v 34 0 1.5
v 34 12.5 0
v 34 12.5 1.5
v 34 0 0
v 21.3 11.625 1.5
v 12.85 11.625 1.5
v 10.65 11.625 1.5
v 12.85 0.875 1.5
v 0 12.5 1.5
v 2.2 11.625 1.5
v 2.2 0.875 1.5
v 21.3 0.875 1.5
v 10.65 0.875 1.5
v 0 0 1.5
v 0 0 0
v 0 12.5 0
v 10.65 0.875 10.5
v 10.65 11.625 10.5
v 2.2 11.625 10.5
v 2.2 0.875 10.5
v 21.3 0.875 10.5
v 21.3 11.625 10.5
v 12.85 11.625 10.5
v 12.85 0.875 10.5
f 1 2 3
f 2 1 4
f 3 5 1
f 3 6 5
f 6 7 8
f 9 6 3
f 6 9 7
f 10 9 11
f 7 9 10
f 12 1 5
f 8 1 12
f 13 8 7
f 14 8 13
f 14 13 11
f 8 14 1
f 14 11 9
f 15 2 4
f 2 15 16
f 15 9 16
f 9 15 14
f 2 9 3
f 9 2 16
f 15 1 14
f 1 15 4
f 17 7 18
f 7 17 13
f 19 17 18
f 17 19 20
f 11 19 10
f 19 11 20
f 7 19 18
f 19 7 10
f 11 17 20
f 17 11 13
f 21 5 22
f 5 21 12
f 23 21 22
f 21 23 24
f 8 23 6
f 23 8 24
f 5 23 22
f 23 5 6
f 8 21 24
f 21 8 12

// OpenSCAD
$fn=100;

base_width_x = 34;
base_length_y = 12.5;
base_z = 1.5;

hole_x = 8.45; //specsheet says 8.9 USE 8.87
hole_y = 10.75; //specsheet says 10.9 USE 10.87
hole_z = 9;

wall_thickness = 2.2;//specsheet says 2.27 USE 2.29

module tapita()
{
    union()
    {   
        cube([base_width_x, base_length_y, base_z]);
        translate([wall_thickness , base_length_y/2 - hole_y/2 , base_z])
        {
            color([0.5,0.3,0.5]) cube([hole_x, hole_y, hole_z]);
        }
       
         translate([2*wall_thickness + hole_x,  base_length_y/2 - hole_y/2 , base_z])
        {
            color([0.5,0.3,0.3]) cube([hole_x, hole_y, hole_z]);
        }
        
    }
}

tapita();
